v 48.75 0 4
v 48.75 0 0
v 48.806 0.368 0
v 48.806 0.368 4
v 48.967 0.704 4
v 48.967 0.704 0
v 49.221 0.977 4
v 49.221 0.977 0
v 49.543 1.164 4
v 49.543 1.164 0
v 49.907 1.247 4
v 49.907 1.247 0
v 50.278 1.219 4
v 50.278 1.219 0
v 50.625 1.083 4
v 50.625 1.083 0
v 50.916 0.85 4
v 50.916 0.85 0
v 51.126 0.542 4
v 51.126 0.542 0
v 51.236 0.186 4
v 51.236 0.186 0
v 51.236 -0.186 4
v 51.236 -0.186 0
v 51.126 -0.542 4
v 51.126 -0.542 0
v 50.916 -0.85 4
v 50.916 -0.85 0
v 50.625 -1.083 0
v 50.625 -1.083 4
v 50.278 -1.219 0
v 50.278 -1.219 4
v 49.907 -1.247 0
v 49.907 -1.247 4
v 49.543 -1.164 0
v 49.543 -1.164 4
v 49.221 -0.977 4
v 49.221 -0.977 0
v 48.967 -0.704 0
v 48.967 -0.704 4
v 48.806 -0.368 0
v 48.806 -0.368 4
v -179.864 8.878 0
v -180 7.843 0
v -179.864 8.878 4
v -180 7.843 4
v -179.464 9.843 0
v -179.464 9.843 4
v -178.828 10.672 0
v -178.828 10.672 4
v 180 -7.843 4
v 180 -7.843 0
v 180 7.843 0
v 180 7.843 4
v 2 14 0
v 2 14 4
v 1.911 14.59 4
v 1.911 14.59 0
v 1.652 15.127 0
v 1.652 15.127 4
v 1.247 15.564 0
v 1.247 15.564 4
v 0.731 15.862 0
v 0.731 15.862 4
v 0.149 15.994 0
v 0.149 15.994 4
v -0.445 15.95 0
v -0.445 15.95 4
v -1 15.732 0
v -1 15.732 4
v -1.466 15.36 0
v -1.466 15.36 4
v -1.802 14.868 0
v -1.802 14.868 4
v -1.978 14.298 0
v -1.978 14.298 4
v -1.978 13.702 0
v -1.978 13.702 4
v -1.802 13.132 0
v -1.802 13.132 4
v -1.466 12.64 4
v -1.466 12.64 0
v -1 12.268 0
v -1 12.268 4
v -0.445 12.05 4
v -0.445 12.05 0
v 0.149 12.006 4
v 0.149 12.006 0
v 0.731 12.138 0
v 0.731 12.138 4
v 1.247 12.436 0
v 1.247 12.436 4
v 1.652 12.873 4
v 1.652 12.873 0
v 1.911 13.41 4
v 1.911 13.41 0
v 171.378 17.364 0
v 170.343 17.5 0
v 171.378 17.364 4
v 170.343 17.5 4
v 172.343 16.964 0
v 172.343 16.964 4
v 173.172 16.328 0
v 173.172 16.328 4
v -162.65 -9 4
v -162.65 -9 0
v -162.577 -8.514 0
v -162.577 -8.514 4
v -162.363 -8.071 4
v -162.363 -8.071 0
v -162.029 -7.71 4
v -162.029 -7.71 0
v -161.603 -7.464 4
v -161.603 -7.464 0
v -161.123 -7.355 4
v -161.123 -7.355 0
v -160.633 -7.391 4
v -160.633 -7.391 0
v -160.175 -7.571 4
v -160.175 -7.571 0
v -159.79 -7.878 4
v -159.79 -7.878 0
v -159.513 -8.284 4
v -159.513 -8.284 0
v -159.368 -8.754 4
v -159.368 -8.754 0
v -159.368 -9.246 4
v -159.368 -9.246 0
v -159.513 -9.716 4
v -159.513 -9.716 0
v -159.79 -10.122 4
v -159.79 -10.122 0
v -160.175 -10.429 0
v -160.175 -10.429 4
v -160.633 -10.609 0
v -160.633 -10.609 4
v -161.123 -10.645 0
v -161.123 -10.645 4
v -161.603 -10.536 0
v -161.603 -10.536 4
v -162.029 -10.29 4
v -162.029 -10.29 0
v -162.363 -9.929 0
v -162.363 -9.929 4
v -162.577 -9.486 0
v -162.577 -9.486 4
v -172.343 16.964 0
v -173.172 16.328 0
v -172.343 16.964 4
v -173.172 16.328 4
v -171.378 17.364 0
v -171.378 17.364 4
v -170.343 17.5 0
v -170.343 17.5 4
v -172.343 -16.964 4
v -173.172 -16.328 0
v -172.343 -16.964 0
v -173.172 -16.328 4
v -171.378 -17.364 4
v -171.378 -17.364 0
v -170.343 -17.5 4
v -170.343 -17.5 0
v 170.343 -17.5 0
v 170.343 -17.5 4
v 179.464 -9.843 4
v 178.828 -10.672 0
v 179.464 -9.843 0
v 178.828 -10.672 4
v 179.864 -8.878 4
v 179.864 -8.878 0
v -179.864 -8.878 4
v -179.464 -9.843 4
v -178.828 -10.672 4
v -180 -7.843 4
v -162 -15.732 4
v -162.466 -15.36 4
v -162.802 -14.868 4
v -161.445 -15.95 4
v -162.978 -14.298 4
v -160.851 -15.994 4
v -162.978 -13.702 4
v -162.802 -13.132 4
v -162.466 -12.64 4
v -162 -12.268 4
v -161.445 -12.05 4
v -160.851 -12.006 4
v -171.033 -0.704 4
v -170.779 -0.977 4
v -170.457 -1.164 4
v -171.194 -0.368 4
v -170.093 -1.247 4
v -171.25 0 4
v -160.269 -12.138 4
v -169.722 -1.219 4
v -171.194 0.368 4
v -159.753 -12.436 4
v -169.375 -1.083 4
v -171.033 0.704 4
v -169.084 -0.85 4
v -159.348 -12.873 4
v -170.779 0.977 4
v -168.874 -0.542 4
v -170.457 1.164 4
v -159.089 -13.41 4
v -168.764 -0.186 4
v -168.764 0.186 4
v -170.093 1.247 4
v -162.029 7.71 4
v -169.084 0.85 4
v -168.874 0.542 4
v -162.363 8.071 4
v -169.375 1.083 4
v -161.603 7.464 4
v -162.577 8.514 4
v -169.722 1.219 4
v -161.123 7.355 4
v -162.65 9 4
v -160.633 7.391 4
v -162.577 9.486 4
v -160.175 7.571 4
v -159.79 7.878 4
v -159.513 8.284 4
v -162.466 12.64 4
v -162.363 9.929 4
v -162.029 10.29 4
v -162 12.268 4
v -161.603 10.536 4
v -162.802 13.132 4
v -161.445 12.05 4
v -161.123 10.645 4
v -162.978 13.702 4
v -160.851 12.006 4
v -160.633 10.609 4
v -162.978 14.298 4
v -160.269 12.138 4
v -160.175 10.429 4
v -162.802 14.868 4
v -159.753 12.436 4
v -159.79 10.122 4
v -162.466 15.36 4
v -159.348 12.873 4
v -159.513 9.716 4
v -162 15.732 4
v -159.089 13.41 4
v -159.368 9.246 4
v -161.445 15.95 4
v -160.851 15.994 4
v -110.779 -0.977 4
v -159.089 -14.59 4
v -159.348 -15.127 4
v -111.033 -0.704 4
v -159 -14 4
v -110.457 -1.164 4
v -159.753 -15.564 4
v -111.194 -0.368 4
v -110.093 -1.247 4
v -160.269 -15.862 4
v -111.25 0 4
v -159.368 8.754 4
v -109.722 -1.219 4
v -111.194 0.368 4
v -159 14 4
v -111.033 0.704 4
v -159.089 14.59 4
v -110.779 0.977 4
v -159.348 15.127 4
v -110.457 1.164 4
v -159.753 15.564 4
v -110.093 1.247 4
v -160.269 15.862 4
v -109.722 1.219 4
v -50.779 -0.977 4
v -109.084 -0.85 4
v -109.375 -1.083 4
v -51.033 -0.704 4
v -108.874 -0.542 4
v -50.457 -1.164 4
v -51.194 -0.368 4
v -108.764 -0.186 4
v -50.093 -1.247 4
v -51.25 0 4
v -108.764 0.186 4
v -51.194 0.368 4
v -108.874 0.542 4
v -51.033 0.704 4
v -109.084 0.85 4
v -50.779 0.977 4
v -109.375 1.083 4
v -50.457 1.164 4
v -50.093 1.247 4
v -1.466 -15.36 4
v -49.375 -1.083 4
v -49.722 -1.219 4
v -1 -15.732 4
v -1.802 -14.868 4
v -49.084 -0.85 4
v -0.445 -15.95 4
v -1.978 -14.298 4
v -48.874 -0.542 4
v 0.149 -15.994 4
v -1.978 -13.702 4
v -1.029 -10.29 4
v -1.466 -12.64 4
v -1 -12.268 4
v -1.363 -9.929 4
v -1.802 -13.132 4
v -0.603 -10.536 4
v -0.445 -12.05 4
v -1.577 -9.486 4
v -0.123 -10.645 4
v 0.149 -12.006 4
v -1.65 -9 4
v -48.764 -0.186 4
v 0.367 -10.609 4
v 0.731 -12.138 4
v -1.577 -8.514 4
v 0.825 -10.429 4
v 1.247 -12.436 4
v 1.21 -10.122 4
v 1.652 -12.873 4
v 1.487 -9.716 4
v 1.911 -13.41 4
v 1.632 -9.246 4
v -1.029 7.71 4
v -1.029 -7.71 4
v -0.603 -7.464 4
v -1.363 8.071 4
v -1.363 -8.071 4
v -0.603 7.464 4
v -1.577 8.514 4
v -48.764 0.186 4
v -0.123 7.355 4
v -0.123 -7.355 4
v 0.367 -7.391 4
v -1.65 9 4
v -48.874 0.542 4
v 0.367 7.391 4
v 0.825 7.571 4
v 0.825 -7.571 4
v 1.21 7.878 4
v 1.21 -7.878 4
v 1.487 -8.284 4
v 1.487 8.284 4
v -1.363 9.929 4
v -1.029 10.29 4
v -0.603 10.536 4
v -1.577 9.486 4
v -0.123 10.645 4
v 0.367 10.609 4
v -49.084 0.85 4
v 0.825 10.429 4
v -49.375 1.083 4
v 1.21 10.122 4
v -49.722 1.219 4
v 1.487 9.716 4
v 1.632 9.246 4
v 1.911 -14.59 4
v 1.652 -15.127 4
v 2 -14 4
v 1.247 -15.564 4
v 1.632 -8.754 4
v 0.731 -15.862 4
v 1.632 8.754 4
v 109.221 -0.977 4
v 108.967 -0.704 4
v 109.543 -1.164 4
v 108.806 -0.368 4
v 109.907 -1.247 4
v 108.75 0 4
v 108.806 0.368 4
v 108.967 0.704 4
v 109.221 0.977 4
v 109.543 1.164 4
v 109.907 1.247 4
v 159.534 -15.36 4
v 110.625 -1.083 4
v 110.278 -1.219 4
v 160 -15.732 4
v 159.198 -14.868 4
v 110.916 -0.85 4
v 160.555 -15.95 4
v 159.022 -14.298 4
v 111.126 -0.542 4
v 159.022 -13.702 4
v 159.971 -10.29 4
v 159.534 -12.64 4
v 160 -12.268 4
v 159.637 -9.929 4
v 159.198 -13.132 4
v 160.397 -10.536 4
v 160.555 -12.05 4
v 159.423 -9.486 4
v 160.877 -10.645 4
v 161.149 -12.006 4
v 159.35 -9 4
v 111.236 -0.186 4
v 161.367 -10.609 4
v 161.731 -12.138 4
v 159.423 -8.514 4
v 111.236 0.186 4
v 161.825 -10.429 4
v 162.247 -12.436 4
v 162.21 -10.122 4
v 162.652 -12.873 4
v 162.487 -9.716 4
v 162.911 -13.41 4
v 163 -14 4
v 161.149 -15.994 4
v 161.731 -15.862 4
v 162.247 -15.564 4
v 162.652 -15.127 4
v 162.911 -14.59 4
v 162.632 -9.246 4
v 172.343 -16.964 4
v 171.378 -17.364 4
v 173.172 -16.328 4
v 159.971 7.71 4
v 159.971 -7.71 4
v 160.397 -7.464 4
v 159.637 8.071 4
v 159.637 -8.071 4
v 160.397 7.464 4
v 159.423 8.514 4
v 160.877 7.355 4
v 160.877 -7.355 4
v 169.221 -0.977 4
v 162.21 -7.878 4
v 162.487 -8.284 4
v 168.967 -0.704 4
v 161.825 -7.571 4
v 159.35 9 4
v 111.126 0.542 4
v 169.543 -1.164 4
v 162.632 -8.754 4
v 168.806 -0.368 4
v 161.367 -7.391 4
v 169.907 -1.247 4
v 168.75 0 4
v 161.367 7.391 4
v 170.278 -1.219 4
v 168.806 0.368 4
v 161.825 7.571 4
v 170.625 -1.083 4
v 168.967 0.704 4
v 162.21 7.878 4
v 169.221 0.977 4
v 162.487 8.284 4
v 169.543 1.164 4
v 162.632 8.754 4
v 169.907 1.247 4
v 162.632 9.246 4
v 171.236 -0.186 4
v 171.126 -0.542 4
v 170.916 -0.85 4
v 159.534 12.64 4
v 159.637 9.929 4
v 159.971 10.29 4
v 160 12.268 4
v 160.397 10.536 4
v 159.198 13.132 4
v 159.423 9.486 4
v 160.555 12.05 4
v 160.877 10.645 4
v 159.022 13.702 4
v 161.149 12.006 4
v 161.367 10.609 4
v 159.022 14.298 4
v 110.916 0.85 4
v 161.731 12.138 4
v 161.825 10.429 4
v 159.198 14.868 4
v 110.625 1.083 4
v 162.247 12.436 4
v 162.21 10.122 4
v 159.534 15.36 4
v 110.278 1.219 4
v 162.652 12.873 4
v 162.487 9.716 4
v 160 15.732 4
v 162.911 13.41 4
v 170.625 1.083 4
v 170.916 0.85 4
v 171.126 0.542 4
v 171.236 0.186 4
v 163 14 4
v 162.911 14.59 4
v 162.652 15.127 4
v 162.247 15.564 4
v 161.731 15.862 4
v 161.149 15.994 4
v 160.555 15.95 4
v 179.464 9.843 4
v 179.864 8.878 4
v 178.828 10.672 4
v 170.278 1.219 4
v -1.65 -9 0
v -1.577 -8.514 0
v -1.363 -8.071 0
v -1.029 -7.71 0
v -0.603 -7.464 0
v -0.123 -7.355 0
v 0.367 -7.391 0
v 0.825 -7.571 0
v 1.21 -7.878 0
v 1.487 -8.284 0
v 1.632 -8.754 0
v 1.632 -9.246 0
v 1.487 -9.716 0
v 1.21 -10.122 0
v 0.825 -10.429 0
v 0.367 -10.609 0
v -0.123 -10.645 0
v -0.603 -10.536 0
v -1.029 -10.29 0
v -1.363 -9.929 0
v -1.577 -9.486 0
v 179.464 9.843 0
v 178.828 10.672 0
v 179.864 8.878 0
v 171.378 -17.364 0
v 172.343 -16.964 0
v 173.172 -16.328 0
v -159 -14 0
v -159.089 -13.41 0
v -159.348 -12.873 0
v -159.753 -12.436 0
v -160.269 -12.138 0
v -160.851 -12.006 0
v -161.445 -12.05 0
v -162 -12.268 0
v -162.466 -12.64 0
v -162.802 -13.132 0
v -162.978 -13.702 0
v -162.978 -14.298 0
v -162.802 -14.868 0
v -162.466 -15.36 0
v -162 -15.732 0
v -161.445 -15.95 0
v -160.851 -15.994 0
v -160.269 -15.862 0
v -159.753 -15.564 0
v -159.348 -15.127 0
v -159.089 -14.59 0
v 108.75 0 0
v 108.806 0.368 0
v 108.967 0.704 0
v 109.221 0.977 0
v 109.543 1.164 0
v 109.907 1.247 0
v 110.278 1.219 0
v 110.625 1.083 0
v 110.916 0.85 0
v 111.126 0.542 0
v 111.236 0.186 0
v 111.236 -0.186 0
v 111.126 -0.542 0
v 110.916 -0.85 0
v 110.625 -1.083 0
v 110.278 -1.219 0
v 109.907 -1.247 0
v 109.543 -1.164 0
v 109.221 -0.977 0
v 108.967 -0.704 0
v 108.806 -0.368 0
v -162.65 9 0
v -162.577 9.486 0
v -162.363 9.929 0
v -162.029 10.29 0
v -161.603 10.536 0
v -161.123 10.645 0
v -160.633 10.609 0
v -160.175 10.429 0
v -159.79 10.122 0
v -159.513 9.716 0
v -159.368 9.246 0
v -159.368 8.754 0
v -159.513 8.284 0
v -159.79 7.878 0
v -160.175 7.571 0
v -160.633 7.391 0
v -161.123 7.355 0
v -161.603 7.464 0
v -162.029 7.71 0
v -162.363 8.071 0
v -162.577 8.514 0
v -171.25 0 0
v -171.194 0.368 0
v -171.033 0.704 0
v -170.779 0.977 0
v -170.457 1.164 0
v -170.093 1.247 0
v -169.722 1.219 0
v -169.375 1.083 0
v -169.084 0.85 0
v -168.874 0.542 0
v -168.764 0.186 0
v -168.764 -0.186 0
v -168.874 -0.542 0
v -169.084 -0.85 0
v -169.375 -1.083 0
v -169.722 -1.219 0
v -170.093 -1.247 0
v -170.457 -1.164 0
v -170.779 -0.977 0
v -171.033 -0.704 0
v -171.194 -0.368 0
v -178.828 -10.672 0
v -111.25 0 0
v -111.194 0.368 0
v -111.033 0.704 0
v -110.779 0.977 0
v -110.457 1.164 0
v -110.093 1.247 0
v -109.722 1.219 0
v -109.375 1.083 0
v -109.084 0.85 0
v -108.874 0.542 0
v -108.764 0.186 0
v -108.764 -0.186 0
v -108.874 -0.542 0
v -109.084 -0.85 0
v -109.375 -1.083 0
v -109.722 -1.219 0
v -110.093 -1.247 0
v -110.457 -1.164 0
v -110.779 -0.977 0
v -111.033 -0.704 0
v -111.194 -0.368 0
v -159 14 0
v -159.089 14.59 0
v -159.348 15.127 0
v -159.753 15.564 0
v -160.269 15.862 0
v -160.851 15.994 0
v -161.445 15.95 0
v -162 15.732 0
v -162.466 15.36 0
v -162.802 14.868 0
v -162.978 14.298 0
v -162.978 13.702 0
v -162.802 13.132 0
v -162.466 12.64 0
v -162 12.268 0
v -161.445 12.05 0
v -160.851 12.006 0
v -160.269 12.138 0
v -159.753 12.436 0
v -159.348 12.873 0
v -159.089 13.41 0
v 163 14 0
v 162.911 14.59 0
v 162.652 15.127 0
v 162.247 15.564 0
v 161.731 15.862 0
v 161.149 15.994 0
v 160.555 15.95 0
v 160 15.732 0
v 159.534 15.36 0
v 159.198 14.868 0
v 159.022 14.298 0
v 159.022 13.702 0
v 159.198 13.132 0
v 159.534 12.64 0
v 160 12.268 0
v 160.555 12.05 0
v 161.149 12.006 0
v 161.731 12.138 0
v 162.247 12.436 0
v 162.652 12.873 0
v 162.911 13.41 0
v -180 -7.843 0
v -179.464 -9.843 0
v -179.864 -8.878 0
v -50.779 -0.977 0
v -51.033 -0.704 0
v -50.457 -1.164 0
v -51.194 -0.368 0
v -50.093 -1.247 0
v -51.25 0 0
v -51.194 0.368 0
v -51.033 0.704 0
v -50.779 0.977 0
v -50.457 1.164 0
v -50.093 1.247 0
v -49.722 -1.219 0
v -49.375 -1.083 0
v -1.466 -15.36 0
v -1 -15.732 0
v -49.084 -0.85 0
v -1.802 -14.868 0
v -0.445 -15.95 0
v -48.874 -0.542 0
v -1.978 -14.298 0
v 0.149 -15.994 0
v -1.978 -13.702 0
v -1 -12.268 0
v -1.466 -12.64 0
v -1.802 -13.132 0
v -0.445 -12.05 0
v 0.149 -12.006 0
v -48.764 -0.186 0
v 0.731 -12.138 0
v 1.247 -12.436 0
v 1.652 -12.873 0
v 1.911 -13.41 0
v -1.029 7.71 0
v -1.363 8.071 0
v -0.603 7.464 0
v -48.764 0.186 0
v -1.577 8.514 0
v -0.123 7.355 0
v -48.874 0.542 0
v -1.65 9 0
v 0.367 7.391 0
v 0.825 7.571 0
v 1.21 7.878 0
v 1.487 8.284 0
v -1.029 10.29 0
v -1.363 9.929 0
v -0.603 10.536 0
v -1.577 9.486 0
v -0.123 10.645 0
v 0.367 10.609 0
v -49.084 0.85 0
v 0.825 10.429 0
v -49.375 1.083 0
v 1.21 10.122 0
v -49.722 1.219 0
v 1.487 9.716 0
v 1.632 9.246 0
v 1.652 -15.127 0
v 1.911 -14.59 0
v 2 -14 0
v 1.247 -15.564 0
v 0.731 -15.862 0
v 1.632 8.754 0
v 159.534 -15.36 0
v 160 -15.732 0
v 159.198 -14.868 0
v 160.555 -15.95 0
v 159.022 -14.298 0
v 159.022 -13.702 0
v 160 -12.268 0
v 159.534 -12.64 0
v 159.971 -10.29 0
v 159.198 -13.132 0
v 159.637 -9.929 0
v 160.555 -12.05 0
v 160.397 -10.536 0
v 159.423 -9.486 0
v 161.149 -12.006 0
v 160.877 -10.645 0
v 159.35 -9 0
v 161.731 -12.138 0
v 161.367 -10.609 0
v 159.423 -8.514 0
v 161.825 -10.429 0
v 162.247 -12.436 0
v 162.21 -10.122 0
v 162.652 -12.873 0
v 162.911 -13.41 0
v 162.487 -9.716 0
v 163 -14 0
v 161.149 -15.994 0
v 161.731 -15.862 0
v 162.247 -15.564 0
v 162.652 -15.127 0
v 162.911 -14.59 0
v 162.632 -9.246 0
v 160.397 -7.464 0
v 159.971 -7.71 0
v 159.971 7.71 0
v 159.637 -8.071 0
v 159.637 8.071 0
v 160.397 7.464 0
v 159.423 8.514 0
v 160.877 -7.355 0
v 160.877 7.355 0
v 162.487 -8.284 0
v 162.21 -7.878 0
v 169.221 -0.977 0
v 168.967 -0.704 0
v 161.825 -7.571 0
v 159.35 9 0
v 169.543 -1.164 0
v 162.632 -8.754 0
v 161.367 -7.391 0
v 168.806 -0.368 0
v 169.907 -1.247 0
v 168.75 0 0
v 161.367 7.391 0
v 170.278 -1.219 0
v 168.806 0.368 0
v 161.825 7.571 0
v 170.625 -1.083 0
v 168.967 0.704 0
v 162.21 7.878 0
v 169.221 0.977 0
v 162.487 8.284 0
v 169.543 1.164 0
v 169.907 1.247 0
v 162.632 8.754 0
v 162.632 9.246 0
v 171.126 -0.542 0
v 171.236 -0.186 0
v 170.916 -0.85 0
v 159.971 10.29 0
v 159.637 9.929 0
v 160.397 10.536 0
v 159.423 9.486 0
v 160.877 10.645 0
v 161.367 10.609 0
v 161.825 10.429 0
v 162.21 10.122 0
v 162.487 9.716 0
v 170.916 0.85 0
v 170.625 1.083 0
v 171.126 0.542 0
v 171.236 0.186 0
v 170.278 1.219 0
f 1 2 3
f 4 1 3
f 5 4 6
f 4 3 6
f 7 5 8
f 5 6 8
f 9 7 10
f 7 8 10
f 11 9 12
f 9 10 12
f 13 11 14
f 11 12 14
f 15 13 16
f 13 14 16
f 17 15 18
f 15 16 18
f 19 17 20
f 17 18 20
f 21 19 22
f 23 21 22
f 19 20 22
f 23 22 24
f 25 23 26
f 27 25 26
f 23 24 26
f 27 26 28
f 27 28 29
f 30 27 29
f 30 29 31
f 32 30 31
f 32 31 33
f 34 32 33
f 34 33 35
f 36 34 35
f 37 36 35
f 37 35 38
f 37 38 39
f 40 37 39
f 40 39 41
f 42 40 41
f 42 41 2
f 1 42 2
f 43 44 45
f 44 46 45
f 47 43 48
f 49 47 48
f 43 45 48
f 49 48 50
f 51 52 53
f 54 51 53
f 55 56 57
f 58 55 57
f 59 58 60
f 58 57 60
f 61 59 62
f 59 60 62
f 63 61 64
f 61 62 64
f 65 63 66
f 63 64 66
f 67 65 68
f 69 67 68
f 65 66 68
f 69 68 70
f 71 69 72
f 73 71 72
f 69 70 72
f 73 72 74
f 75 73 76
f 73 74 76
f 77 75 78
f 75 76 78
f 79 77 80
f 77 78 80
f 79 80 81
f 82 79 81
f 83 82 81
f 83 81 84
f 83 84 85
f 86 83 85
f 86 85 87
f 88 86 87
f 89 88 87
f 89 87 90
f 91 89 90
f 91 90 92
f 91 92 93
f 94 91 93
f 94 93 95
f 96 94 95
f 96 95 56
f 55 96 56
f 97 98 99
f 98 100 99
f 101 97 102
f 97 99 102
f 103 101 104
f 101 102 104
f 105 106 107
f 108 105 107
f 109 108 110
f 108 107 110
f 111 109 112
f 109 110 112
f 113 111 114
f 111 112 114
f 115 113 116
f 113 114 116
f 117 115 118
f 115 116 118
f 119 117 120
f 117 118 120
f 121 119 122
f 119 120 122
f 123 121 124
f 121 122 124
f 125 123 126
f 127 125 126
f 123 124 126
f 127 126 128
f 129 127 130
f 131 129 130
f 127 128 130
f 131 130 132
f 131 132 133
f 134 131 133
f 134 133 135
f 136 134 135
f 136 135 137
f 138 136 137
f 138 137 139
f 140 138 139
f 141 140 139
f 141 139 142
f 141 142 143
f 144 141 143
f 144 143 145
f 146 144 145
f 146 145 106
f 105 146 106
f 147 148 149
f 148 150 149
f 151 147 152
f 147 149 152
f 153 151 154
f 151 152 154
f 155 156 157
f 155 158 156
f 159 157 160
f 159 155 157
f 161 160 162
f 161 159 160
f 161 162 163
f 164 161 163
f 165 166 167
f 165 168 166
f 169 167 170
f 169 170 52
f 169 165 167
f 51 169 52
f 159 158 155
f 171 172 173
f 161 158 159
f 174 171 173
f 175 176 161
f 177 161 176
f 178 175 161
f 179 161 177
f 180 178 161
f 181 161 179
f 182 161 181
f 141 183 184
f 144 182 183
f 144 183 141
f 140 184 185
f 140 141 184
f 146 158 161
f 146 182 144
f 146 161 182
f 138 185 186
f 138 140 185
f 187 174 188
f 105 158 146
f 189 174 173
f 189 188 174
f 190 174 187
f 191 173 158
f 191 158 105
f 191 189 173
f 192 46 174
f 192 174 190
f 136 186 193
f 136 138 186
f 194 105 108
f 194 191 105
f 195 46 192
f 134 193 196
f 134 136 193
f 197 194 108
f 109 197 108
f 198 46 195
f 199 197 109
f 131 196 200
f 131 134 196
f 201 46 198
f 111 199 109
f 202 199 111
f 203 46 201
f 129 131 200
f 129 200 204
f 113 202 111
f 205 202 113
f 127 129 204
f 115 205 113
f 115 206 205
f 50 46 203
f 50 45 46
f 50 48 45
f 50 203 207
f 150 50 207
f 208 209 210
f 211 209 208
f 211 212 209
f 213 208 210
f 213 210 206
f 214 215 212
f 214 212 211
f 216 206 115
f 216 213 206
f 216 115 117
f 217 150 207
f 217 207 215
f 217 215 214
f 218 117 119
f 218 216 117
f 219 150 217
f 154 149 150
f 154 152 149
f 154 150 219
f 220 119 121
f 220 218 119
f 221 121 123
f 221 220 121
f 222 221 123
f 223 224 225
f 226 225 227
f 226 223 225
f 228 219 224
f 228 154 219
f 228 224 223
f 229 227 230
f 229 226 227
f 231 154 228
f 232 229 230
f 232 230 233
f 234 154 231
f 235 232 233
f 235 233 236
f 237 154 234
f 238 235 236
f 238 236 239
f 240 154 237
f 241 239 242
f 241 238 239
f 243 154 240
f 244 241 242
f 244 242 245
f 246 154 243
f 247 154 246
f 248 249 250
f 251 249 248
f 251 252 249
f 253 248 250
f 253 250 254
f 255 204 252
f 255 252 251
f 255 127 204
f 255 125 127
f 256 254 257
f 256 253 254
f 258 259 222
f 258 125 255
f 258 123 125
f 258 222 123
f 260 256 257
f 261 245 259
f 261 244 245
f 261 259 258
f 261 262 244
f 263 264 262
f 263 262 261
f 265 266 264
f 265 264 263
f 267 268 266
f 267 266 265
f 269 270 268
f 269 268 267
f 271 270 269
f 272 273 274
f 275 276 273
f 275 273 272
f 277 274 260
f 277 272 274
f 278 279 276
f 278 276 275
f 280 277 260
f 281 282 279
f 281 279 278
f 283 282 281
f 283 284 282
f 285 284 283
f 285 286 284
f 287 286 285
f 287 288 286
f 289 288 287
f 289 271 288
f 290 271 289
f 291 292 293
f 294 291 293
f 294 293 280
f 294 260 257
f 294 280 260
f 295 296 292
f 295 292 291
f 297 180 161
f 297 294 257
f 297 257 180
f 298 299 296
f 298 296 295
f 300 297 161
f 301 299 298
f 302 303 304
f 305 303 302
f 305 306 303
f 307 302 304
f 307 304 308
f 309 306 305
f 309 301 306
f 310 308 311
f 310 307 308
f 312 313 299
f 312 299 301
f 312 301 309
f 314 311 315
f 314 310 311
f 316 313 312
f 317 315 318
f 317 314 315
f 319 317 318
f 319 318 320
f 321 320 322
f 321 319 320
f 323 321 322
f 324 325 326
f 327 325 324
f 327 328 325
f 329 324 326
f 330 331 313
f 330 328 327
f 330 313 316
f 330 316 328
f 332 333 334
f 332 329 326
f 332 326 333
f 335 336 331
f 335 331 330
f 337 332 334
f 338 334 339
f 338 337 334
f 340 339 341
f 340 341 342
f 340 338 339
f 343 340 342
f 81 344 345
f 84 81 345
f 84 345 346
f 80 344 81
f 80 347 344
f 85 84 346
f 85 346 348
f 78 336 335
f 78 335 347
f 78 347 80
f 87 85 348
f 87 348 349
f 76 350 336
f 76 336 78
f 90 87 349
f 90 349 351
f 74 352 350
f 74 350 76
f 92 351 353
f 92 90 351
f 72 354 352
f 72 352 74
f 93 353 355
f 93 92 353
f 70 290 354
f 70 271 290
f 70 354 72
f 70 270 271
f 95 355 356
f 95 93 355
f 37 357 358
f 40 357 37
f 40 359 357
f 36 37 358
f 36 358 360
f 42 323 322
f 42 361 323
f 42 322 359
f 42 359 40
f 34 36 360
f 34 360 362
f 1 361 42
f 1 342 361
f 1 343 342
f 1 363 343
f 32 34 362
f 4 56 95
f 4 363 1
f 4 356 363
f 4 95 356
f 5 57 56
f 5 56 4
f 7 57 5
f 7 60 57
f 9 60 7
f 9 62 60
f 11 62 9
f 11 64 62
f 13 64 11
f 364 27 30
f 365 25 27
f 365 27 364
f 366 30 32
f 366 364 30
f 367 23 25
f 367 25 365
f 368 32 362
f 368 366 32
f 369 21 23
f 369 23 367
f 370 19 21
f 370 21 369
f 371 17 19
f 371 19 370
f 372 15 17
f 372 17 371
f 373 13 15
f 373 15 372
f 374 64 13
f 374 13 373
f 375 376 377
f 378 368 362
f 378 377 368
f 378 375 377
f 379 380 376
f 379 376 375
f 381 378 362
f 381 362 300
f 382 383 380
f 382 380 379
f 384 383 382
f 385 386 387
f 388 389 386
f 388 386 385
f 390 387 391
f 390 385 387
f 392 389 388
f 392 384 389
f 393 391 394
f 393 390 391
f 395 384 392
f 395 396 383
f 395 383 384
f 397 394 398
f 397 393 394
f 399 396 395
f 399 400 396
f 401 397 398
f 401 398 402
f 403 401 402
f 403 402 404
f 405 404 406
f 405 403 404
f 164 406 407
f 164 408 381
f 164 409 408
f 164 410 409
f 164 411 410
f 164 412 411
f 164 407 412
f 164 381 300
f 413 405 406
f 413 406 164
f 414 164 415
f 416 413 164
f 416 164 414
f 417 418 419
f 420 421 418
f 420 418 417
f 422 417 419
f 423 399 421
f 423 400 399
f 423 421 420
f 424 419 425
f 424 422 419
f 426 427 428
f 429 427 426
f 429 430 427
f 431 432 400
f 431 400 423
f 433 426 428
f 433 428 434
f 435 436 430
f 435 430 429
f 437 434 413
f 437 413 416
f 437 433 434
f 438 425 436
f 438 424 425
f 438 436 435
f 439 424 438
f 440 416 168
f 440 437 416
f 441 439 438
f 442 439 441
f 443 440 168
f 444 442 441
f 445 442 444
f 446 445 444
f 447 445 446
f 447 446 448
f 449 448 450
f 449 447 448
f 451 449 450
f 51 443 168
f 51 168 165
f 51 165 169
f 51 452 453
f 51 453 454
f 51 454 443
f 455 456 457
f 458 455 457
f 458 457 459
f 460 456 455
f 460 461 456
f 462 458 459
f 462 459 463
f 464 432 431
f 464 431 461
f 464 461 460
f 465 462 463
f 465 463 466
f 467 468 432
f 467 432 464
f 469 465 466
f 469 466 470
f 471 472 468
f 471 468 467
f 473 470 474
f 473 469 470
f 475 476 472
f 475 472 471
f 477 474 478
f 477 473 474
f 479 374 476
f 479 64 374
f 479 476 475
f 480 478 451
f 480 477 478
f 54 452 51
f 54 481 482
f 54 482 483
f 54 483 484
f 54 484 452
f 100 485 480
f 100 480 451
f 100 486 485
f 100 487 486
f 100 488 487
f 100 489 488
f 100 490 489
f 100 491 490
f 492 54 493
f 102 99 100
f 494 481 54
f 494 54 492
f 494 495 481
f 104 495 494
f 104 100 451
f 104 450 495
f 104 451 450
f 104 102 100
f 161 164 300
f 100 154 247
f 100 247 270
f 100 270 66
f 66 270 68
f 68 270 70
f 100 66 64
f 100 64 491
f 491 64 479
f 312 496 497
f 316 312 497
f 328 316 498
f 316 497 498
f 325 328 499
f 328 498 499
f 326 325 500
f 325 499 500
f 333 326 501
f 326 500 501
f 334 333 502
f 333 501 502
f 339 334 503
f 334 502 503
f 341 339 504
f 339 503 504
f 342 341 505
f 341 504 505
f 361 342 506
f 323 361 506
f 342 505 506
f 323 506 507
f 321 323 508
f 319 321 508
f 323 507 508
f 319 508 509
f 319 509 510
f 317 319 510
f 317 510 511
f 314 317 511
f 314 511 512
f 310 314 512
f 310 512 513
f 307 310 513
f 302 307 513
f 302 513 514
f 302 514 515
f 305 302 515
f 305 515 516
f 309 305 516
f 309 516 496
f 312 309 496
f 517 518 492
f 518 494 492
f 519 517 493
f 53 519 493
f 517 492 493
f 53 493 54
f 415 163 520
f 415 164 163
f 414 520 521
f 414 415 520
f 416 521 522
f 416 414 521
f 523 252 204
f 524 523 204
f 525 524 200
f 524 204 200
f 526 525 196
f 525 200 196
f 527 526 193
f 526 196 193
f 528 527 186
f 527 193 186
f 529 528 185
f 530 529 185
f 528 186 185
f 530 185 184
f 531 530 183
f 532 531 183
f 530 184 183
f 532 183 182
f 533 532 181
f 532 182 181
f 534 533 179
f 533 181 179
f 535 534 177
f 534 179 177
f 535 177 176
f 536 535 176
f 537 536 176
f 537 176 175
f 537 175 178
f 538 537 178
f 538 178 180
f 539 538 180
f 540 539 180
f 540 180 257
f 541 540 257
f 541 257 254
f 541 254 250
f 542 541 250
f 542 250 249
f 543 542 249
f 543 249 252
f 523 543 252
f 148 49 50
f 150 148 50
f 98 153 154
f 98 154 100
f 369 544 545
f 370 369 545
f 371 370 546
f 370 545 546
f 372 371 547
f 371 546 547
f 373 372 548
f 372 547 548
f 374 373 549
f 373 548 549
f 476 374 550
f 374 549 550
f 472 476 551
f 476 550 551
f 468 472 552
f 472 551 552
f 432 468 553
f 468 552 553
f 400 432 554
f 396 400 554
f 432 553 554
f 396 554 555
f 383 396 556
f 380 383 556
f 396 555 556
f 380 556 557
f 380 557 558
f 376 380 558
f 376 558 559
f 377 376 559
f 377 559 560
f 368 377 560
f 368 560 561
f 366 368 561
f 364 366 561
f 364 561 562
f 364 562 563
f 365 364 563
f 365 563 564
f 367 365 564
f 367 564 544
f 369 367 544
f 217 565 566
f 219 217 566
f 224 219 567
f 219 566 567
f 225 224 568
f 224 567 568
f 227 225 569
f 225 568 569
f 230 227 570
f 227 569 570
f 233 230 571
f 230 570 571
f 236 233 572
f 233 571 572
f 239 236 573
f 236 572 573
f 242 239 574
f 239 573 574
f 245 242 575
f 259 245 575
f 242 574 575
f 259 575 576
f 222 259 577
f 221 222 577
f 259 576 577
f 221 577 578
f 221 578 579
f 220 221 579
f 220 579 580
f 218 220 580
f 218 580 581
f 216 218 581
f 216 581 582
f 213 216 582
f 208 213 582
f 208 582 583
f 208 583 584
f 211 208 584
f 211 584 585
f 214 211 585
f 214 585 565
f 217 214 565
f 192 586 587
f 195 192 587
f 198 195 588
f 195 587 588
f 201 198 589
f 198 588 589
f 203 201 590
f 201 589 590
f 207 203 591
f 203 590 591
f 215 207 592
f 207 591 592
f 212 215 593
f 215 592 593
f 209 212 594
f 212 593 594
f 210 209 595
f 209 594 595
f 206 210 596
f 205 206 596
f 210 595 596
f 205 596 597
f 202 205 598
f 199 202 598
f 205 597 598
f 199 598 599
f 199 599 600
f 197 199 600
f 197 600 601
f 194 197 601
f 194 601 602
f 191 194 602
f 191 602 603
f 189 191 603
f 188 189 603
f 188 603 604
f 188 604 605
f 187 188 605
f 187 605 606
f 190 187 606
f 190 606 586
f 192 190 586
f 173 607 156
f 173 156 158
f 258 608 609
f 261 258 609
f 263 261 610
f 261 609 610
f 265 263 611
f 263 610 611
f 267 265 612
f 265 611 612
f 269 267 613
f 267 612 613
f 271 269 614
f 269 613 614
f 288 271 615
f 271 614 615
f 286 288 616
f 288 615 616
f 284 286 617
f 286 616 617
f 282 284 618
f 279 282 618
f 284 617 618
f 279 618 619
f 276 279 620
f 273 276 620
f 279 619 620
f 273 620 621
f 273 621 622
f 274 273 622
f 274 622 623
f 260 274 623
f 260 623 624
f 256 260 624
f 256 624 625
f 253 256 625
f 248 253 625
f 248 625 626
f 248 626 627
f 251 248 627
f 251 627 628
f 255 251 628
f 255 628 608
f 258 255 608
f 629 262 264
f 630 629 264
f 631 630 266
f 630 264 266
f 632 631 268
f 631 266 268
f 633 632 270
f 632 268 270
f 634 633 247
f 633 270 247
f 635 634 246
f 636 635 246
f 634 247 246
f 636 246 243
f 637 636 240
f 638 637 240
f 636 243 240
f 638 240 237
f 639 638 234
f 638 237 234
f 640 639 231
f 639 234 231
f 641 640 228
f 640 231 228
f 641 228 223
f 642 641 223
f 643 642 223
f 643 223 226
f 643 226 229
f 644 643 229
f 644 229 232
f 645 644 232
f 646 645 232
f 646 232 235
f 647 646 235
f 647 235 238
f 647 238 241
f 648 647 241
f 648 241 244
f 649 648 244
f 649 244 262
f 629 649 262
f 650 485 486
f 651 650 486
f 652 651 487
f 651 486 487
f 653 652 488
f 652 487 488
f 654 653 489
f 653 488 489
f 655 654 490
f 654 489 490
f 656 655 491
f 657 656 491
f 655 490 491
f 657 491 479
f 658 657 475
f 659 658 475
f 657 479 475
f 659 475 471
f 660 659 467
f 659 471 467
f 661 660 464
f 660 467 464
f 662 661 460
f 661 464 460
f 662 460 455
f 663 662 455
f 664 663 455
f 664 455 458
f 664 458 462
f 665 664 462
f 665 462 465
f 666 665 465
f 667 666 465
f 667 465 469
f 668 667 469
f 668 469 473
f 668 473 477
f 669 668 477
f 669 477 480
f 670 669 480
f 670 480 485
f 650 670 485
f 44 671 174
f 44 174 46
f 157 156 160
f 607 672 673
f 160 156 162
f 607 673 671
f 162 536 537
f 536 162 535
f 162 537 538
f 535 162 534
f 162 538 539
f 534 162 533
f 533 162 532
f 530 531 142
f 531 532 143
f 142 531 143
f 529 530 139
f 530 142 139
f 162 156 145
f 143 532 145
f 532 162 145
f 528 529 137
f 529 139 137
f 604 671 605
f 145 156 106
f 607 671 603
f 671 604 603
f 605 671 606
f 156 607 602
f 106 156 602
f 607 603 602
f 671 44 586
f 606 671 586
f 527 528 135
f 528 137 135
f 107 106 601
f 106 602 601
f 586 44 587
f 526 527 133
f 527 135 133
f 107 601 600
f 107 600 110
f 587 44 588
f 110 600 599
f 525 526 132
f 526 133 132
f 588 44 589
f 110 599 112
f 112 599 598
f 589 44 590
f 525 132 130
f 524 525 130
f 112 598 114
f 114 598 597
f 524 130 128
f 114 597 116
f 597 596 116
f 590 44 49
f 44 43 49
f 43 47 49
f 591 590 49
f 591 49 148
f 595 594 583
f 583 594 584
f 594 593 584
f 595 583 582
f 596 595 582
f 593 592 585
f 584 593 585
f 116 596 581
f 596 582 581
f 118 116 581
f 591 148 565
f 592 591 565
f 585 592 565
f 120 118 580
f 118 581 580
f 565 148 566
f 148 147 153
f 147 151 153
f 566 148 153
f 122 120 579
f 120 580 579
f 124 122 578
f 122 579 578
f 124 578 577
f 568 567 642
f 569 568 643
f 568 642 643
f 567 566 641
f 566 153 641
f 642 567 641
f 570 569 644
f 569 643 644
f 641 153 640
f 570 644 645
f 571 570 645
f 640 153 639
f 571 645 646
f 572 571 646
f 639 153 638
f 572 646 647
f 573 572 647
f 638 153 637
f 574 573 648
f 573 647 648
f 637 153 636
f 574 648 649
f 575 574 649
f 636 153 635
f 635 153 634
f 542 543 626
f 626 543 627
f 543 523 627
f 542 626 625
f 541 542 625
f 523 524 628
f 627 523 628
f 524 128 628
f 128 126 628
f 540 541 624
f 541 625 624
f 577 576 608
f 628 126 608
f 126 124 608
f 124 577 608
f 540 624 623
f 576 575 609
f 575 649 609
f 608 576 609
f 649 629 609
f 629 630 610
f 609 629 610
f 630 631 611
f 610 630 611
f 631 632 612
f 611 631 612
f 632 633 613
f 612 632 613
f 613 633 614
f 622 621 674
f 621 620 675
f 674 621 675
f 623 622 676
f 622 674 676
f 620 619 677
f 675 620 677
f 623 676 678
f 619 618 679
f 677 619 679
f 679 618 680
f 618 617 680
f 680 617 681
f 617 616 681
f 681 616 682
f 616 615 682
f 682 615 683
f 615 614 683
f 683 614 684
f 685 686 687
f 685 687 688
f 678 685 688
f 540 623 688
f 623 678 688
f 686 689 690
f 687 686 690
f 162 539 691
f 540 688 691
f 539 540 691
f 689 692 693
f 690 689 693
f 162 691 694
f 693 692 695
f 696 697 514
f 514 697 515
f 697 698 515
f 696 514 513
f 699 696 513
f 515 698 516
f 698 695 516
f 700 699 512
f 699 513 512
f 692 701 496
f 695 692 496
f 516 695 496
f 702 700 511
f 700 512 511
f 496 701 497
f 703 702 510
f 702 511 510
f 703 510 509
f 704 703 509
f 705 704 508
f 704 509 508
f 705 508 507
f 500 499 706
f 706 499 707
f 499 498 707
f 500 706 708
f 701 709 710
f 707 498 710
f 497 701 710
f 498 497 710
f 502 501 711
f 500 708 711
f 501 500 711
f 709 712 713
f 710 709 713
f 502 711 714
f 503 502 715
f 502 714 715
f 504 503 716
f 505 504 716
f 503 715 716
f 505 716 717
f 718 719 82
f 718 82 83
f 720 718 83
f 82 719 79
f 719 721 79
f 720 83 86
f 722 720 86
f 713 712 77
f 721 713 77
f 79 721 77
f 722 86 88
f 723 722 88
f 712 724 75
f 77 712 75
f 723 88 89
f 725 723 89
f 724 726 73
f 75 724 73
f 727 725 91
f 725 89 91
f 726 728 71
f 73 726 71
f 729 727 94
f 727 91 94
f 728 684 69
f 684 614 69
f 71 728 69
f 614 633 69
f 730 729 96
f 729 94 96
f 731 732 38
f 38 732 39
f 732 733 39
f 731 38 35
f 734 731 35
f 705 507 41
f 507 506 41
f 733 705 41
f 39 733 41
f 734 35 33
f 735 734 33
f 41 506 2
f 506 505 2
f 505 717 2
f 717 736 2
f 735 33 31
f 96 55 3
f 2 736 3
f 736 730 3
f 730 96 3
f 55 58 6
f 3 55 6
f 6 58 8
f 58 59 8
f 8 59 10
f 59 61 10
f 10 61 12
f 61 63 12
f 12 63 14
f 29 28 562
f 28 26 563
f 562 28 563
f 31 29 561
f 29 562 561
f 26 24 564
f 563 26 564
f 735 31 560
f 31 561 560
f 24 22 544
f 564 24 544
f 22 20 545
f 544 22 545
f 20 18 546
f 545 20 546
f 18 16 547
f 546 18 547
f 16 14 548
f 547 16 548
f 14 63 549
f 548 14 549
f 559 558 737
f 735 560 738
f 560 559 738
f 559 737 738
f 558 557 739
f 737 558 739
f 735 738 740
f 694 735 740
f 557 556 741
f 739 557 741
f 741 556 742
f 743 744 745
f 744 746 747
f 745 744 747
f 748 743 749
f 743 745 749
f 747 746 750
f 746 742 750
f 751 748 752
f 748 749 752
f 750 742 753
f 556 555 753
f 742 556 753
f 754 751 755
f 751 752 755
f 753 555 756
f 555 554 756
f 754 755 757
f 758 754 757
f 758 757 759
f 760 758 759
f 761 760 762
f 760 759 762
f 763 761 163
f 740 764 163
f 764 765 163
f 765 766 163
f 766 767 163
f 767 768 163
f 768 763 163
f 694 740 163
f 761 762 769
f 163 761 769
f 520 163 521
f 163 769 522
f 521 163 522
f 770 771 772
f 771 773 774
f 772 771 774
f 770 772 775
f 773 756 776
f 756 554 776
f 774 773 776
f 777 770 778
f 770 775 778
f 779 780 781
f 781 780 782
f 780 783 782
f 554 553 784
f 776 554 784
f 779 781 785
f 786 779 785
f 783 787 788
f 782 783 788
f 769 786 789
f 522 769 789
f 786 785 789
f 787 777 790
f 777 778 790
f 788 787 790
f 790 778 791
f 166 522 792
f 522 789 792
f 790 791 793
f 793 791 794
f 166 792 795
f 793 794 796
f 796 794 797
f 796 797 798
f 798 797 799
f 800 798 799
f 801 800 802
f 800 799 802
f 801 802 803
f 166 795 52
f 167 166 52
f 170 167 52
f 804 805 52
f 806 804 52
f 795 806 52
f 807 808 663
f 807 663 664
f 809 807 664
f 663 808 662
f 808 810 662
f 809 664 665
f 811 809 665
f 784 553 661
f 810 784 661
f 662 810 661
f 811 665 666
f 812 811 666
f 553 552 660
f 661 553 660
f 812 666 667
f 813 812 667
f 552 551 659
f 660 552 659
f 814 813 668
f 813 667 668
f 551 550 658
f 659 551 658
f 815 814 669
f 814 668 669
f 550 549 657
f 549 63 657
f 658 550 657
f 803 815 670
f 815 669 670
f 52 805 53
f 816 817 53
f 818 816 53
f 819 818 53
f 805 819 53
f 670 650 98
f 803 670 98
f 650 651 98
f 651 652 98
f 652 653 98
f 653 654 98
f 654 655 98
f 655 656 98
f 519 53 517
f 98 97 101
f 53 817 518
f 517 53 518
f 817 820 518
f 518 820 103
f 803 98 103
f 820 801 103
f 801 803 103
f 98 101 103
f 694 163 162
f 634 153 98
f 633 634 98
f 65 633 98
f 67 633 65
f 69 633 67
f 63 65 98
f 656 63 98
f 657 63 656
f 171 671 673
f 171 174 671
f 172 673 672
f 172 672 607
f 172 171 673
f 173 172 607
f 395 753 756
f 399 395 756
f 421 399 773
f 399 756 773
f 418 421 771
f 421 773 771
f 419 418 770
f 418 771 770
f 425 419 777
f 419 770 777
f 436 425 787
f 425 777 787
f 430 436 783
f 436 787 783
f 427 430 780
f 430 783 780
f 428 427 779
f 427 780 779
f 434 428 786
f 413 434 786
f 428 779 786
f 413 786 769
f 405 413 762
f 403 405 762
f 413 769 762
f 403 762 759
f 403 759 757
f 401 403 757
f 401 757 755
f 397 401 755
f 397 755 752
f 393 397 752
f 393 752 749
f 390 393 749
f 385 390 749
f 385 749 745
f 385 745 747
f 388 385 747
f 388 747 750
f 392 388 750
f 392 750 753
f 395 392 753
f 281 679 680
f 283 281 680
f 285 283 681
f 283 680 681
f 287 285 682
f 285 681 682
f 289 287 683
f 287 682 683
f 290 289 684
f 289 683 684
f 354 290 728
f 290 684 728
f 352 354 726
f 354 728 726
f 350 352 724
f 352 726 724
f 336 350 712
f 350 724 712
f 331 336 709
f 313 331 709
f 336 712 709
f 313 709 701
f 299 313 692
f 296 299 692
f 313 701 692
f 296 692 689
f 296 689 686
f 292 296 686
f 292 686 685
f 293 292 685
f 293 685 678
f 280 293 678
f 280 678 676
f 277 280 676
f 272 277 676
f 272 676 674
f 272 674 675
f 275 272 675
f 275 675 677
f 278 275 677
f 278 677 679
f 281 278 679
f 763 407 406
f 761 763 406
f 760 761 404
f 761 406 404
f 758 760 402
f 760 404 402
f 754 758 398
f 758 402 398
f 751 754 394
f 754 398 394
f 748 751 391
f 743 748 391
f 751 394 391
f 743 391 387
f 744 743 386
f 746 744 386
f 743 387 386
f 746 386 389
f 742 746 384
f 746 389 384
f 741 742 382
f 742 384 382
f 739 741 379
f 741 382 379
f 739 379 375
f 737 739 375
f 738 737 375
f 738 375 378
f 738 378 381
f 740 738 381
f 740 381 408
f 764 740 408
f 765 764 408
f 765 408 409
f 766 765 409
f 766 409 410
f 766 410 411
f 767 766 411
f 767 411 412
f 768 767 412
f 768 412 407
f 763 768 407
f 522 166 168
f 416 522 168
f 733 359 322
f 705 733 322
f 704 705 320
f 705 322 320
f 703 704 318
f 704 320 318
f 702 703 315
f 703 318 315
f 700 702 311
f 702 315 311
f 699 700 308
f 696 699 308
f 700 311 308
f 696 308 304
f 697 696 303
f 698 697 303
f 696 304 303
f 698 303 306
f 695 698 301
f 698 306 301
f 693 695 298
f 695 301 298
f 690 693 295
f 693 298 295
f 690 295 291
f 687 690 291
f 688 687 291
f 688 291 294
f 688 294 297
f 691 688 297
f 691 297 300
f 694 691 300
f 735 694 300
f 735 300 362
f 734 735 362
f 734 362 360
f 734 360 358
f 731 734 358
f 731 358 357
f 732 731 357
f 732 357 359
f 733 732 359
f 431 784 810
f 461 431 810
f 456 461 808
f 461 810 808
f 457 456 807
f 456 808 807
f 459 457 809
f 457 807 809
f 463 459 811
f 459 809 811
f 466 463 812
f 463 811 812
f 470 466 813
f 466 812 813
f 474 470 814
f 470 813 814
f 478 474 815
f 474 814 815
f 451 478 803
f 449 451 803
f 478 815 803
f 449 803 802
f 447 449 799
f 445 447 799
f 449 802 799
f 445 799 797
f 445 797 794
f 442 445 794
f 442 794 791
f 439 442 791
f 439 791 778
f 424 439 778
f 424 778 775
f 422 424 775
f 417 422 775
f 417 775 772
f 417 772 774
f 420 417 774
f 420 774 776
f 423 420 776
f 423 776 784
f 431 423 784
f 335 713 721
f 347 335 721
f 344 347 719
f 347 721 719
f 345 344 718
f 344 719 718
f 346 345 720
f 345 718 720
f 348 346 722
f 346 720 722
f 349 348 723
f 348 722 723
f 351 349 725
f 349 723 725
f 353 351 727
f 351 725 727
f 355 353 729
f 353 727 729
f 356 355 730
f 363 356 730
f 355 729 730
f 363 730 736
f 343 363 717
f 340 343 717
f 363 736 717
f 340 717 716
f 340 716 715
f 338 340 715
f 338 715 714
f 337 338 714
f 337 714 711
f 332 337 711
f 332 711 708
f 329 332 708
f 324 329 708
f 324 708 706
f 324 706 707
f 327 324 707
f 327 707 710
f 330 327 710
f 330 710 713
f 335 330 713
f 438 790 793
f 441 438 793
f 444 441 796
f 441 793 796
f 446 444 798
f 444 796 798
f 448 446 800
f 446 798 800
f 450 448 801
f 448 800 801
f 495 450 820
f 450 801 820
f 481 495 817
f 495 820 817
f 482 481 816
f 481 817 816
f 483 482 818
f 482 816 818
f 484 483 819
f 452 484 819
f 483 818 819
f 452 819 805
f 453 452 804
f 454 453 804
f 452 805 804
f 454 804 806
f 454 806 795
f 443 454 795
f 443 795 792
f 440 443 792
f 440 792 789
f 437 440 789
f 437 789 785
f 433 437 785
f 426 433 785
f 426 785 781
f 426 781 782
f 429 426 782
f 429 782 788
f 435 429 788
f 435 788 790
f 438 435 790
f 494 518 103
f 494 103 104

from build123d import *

# Parameters (mm, degrees)
CROQUIS1_W                                 = 360
CROQUIS1_H                                 = 35
SALIENTE_EXTRUIR1_DEPTH                    = 4
CROQUIS2_R                                 = 2
CORTAR_EXTRUIR1_DEPTH                      = 5
PERFORADOR_PARA_ROSCAR_PARA_MACHO_DE_ROS_D = 3.3
TALADRO_ROSCADO_M31_D                      = 2.5
CHAFL_N1_SIZE                              = 8
REDONDEO2_R                                = 4


with BuildPart() as part:
    # Croquis1 → Saliente-Extruir1 (new body)
    with BuildSketch(Plane.XY):
        Rectangle(CROQUIS1_W, CROQUIS1_H)
    extrude(amount=SALIENTE_EXTRUIR1_DEPTH)

    # Croquis2 → Cortar-Extruir1 (cut)
    with BuildSketch(Plane.XY.offset(4)):
        with Locations((0, 14)):
            Circle(CROQUIS2_R)
        with Locations((0, -14)):
            Circle(CROQUIS2_R)
        with Locations((161, 14)):
            Circle(CROQUIS2_R)
        with Locations((161, -14)):
            Circle(CROQUIS2_R)
        with Locations((-161, 14)):
            Circle(CROQUIS2_R)
        with Locations((-161, -14)):
            Circle(CROQUIS2_R)
    extrude(amount=-CORTAR_EXTRUIR1_DEPTH, mode=Mode.SUBTRACT)

    # Perforador para roscar para macho de roscar para M41 (through all)
    with Locations(Plane(origin=(-161, 9, 4), x_dir=(1, 0, 0), z_dir=(0, 0, 1))):
        with Locations((0, 0), (0, -18), (161, 0), (161, -18), (322, 0), (322, -18)):
            Hole(PERFORADOR_PARA_ROSCAR_PARA_MACHO_DE_ROS_D / 2)

    # Taladro roscado M31 (through all)
    with Locations(Plane.XY.offset(4)):
        with Locations((-170, 0), (-110, 0), (-50, 0), (50, 0), (110, 0), (170, 0)):
            Hole(TALADRO_ROSCADO_M31_D / 2)

    # Chaflán1
    chafl_n1_edges = [part.edges().sort_by_distance(p)[0] for p in [
        (180, -17.5, 2),
        (-180, -17.5, 2),
        (-180, 17.5, 2),
        (180, 17.5, 2),
    ]]
    chamfer(chafl_n1_edges, length=CHAFL_N1_SIZE)

    # Redondeo2
    redondeo2_edges = [part.edges().sort_by_distance(p)[0] for p in [
        (180, 9.5, 2),
        (180, -9.5, 2),
        (-172, -17.5, 2),
        (172, -17.5, 2),
        (-172, 17.5, 2),
        (172, 17.5, 2),
        (-180, 9.5, 2),
        (-180, -9.5, 2),
    ]]
    fillet(redondeo2_edges, radius=REDONDEO2_R)


solid = part.part
